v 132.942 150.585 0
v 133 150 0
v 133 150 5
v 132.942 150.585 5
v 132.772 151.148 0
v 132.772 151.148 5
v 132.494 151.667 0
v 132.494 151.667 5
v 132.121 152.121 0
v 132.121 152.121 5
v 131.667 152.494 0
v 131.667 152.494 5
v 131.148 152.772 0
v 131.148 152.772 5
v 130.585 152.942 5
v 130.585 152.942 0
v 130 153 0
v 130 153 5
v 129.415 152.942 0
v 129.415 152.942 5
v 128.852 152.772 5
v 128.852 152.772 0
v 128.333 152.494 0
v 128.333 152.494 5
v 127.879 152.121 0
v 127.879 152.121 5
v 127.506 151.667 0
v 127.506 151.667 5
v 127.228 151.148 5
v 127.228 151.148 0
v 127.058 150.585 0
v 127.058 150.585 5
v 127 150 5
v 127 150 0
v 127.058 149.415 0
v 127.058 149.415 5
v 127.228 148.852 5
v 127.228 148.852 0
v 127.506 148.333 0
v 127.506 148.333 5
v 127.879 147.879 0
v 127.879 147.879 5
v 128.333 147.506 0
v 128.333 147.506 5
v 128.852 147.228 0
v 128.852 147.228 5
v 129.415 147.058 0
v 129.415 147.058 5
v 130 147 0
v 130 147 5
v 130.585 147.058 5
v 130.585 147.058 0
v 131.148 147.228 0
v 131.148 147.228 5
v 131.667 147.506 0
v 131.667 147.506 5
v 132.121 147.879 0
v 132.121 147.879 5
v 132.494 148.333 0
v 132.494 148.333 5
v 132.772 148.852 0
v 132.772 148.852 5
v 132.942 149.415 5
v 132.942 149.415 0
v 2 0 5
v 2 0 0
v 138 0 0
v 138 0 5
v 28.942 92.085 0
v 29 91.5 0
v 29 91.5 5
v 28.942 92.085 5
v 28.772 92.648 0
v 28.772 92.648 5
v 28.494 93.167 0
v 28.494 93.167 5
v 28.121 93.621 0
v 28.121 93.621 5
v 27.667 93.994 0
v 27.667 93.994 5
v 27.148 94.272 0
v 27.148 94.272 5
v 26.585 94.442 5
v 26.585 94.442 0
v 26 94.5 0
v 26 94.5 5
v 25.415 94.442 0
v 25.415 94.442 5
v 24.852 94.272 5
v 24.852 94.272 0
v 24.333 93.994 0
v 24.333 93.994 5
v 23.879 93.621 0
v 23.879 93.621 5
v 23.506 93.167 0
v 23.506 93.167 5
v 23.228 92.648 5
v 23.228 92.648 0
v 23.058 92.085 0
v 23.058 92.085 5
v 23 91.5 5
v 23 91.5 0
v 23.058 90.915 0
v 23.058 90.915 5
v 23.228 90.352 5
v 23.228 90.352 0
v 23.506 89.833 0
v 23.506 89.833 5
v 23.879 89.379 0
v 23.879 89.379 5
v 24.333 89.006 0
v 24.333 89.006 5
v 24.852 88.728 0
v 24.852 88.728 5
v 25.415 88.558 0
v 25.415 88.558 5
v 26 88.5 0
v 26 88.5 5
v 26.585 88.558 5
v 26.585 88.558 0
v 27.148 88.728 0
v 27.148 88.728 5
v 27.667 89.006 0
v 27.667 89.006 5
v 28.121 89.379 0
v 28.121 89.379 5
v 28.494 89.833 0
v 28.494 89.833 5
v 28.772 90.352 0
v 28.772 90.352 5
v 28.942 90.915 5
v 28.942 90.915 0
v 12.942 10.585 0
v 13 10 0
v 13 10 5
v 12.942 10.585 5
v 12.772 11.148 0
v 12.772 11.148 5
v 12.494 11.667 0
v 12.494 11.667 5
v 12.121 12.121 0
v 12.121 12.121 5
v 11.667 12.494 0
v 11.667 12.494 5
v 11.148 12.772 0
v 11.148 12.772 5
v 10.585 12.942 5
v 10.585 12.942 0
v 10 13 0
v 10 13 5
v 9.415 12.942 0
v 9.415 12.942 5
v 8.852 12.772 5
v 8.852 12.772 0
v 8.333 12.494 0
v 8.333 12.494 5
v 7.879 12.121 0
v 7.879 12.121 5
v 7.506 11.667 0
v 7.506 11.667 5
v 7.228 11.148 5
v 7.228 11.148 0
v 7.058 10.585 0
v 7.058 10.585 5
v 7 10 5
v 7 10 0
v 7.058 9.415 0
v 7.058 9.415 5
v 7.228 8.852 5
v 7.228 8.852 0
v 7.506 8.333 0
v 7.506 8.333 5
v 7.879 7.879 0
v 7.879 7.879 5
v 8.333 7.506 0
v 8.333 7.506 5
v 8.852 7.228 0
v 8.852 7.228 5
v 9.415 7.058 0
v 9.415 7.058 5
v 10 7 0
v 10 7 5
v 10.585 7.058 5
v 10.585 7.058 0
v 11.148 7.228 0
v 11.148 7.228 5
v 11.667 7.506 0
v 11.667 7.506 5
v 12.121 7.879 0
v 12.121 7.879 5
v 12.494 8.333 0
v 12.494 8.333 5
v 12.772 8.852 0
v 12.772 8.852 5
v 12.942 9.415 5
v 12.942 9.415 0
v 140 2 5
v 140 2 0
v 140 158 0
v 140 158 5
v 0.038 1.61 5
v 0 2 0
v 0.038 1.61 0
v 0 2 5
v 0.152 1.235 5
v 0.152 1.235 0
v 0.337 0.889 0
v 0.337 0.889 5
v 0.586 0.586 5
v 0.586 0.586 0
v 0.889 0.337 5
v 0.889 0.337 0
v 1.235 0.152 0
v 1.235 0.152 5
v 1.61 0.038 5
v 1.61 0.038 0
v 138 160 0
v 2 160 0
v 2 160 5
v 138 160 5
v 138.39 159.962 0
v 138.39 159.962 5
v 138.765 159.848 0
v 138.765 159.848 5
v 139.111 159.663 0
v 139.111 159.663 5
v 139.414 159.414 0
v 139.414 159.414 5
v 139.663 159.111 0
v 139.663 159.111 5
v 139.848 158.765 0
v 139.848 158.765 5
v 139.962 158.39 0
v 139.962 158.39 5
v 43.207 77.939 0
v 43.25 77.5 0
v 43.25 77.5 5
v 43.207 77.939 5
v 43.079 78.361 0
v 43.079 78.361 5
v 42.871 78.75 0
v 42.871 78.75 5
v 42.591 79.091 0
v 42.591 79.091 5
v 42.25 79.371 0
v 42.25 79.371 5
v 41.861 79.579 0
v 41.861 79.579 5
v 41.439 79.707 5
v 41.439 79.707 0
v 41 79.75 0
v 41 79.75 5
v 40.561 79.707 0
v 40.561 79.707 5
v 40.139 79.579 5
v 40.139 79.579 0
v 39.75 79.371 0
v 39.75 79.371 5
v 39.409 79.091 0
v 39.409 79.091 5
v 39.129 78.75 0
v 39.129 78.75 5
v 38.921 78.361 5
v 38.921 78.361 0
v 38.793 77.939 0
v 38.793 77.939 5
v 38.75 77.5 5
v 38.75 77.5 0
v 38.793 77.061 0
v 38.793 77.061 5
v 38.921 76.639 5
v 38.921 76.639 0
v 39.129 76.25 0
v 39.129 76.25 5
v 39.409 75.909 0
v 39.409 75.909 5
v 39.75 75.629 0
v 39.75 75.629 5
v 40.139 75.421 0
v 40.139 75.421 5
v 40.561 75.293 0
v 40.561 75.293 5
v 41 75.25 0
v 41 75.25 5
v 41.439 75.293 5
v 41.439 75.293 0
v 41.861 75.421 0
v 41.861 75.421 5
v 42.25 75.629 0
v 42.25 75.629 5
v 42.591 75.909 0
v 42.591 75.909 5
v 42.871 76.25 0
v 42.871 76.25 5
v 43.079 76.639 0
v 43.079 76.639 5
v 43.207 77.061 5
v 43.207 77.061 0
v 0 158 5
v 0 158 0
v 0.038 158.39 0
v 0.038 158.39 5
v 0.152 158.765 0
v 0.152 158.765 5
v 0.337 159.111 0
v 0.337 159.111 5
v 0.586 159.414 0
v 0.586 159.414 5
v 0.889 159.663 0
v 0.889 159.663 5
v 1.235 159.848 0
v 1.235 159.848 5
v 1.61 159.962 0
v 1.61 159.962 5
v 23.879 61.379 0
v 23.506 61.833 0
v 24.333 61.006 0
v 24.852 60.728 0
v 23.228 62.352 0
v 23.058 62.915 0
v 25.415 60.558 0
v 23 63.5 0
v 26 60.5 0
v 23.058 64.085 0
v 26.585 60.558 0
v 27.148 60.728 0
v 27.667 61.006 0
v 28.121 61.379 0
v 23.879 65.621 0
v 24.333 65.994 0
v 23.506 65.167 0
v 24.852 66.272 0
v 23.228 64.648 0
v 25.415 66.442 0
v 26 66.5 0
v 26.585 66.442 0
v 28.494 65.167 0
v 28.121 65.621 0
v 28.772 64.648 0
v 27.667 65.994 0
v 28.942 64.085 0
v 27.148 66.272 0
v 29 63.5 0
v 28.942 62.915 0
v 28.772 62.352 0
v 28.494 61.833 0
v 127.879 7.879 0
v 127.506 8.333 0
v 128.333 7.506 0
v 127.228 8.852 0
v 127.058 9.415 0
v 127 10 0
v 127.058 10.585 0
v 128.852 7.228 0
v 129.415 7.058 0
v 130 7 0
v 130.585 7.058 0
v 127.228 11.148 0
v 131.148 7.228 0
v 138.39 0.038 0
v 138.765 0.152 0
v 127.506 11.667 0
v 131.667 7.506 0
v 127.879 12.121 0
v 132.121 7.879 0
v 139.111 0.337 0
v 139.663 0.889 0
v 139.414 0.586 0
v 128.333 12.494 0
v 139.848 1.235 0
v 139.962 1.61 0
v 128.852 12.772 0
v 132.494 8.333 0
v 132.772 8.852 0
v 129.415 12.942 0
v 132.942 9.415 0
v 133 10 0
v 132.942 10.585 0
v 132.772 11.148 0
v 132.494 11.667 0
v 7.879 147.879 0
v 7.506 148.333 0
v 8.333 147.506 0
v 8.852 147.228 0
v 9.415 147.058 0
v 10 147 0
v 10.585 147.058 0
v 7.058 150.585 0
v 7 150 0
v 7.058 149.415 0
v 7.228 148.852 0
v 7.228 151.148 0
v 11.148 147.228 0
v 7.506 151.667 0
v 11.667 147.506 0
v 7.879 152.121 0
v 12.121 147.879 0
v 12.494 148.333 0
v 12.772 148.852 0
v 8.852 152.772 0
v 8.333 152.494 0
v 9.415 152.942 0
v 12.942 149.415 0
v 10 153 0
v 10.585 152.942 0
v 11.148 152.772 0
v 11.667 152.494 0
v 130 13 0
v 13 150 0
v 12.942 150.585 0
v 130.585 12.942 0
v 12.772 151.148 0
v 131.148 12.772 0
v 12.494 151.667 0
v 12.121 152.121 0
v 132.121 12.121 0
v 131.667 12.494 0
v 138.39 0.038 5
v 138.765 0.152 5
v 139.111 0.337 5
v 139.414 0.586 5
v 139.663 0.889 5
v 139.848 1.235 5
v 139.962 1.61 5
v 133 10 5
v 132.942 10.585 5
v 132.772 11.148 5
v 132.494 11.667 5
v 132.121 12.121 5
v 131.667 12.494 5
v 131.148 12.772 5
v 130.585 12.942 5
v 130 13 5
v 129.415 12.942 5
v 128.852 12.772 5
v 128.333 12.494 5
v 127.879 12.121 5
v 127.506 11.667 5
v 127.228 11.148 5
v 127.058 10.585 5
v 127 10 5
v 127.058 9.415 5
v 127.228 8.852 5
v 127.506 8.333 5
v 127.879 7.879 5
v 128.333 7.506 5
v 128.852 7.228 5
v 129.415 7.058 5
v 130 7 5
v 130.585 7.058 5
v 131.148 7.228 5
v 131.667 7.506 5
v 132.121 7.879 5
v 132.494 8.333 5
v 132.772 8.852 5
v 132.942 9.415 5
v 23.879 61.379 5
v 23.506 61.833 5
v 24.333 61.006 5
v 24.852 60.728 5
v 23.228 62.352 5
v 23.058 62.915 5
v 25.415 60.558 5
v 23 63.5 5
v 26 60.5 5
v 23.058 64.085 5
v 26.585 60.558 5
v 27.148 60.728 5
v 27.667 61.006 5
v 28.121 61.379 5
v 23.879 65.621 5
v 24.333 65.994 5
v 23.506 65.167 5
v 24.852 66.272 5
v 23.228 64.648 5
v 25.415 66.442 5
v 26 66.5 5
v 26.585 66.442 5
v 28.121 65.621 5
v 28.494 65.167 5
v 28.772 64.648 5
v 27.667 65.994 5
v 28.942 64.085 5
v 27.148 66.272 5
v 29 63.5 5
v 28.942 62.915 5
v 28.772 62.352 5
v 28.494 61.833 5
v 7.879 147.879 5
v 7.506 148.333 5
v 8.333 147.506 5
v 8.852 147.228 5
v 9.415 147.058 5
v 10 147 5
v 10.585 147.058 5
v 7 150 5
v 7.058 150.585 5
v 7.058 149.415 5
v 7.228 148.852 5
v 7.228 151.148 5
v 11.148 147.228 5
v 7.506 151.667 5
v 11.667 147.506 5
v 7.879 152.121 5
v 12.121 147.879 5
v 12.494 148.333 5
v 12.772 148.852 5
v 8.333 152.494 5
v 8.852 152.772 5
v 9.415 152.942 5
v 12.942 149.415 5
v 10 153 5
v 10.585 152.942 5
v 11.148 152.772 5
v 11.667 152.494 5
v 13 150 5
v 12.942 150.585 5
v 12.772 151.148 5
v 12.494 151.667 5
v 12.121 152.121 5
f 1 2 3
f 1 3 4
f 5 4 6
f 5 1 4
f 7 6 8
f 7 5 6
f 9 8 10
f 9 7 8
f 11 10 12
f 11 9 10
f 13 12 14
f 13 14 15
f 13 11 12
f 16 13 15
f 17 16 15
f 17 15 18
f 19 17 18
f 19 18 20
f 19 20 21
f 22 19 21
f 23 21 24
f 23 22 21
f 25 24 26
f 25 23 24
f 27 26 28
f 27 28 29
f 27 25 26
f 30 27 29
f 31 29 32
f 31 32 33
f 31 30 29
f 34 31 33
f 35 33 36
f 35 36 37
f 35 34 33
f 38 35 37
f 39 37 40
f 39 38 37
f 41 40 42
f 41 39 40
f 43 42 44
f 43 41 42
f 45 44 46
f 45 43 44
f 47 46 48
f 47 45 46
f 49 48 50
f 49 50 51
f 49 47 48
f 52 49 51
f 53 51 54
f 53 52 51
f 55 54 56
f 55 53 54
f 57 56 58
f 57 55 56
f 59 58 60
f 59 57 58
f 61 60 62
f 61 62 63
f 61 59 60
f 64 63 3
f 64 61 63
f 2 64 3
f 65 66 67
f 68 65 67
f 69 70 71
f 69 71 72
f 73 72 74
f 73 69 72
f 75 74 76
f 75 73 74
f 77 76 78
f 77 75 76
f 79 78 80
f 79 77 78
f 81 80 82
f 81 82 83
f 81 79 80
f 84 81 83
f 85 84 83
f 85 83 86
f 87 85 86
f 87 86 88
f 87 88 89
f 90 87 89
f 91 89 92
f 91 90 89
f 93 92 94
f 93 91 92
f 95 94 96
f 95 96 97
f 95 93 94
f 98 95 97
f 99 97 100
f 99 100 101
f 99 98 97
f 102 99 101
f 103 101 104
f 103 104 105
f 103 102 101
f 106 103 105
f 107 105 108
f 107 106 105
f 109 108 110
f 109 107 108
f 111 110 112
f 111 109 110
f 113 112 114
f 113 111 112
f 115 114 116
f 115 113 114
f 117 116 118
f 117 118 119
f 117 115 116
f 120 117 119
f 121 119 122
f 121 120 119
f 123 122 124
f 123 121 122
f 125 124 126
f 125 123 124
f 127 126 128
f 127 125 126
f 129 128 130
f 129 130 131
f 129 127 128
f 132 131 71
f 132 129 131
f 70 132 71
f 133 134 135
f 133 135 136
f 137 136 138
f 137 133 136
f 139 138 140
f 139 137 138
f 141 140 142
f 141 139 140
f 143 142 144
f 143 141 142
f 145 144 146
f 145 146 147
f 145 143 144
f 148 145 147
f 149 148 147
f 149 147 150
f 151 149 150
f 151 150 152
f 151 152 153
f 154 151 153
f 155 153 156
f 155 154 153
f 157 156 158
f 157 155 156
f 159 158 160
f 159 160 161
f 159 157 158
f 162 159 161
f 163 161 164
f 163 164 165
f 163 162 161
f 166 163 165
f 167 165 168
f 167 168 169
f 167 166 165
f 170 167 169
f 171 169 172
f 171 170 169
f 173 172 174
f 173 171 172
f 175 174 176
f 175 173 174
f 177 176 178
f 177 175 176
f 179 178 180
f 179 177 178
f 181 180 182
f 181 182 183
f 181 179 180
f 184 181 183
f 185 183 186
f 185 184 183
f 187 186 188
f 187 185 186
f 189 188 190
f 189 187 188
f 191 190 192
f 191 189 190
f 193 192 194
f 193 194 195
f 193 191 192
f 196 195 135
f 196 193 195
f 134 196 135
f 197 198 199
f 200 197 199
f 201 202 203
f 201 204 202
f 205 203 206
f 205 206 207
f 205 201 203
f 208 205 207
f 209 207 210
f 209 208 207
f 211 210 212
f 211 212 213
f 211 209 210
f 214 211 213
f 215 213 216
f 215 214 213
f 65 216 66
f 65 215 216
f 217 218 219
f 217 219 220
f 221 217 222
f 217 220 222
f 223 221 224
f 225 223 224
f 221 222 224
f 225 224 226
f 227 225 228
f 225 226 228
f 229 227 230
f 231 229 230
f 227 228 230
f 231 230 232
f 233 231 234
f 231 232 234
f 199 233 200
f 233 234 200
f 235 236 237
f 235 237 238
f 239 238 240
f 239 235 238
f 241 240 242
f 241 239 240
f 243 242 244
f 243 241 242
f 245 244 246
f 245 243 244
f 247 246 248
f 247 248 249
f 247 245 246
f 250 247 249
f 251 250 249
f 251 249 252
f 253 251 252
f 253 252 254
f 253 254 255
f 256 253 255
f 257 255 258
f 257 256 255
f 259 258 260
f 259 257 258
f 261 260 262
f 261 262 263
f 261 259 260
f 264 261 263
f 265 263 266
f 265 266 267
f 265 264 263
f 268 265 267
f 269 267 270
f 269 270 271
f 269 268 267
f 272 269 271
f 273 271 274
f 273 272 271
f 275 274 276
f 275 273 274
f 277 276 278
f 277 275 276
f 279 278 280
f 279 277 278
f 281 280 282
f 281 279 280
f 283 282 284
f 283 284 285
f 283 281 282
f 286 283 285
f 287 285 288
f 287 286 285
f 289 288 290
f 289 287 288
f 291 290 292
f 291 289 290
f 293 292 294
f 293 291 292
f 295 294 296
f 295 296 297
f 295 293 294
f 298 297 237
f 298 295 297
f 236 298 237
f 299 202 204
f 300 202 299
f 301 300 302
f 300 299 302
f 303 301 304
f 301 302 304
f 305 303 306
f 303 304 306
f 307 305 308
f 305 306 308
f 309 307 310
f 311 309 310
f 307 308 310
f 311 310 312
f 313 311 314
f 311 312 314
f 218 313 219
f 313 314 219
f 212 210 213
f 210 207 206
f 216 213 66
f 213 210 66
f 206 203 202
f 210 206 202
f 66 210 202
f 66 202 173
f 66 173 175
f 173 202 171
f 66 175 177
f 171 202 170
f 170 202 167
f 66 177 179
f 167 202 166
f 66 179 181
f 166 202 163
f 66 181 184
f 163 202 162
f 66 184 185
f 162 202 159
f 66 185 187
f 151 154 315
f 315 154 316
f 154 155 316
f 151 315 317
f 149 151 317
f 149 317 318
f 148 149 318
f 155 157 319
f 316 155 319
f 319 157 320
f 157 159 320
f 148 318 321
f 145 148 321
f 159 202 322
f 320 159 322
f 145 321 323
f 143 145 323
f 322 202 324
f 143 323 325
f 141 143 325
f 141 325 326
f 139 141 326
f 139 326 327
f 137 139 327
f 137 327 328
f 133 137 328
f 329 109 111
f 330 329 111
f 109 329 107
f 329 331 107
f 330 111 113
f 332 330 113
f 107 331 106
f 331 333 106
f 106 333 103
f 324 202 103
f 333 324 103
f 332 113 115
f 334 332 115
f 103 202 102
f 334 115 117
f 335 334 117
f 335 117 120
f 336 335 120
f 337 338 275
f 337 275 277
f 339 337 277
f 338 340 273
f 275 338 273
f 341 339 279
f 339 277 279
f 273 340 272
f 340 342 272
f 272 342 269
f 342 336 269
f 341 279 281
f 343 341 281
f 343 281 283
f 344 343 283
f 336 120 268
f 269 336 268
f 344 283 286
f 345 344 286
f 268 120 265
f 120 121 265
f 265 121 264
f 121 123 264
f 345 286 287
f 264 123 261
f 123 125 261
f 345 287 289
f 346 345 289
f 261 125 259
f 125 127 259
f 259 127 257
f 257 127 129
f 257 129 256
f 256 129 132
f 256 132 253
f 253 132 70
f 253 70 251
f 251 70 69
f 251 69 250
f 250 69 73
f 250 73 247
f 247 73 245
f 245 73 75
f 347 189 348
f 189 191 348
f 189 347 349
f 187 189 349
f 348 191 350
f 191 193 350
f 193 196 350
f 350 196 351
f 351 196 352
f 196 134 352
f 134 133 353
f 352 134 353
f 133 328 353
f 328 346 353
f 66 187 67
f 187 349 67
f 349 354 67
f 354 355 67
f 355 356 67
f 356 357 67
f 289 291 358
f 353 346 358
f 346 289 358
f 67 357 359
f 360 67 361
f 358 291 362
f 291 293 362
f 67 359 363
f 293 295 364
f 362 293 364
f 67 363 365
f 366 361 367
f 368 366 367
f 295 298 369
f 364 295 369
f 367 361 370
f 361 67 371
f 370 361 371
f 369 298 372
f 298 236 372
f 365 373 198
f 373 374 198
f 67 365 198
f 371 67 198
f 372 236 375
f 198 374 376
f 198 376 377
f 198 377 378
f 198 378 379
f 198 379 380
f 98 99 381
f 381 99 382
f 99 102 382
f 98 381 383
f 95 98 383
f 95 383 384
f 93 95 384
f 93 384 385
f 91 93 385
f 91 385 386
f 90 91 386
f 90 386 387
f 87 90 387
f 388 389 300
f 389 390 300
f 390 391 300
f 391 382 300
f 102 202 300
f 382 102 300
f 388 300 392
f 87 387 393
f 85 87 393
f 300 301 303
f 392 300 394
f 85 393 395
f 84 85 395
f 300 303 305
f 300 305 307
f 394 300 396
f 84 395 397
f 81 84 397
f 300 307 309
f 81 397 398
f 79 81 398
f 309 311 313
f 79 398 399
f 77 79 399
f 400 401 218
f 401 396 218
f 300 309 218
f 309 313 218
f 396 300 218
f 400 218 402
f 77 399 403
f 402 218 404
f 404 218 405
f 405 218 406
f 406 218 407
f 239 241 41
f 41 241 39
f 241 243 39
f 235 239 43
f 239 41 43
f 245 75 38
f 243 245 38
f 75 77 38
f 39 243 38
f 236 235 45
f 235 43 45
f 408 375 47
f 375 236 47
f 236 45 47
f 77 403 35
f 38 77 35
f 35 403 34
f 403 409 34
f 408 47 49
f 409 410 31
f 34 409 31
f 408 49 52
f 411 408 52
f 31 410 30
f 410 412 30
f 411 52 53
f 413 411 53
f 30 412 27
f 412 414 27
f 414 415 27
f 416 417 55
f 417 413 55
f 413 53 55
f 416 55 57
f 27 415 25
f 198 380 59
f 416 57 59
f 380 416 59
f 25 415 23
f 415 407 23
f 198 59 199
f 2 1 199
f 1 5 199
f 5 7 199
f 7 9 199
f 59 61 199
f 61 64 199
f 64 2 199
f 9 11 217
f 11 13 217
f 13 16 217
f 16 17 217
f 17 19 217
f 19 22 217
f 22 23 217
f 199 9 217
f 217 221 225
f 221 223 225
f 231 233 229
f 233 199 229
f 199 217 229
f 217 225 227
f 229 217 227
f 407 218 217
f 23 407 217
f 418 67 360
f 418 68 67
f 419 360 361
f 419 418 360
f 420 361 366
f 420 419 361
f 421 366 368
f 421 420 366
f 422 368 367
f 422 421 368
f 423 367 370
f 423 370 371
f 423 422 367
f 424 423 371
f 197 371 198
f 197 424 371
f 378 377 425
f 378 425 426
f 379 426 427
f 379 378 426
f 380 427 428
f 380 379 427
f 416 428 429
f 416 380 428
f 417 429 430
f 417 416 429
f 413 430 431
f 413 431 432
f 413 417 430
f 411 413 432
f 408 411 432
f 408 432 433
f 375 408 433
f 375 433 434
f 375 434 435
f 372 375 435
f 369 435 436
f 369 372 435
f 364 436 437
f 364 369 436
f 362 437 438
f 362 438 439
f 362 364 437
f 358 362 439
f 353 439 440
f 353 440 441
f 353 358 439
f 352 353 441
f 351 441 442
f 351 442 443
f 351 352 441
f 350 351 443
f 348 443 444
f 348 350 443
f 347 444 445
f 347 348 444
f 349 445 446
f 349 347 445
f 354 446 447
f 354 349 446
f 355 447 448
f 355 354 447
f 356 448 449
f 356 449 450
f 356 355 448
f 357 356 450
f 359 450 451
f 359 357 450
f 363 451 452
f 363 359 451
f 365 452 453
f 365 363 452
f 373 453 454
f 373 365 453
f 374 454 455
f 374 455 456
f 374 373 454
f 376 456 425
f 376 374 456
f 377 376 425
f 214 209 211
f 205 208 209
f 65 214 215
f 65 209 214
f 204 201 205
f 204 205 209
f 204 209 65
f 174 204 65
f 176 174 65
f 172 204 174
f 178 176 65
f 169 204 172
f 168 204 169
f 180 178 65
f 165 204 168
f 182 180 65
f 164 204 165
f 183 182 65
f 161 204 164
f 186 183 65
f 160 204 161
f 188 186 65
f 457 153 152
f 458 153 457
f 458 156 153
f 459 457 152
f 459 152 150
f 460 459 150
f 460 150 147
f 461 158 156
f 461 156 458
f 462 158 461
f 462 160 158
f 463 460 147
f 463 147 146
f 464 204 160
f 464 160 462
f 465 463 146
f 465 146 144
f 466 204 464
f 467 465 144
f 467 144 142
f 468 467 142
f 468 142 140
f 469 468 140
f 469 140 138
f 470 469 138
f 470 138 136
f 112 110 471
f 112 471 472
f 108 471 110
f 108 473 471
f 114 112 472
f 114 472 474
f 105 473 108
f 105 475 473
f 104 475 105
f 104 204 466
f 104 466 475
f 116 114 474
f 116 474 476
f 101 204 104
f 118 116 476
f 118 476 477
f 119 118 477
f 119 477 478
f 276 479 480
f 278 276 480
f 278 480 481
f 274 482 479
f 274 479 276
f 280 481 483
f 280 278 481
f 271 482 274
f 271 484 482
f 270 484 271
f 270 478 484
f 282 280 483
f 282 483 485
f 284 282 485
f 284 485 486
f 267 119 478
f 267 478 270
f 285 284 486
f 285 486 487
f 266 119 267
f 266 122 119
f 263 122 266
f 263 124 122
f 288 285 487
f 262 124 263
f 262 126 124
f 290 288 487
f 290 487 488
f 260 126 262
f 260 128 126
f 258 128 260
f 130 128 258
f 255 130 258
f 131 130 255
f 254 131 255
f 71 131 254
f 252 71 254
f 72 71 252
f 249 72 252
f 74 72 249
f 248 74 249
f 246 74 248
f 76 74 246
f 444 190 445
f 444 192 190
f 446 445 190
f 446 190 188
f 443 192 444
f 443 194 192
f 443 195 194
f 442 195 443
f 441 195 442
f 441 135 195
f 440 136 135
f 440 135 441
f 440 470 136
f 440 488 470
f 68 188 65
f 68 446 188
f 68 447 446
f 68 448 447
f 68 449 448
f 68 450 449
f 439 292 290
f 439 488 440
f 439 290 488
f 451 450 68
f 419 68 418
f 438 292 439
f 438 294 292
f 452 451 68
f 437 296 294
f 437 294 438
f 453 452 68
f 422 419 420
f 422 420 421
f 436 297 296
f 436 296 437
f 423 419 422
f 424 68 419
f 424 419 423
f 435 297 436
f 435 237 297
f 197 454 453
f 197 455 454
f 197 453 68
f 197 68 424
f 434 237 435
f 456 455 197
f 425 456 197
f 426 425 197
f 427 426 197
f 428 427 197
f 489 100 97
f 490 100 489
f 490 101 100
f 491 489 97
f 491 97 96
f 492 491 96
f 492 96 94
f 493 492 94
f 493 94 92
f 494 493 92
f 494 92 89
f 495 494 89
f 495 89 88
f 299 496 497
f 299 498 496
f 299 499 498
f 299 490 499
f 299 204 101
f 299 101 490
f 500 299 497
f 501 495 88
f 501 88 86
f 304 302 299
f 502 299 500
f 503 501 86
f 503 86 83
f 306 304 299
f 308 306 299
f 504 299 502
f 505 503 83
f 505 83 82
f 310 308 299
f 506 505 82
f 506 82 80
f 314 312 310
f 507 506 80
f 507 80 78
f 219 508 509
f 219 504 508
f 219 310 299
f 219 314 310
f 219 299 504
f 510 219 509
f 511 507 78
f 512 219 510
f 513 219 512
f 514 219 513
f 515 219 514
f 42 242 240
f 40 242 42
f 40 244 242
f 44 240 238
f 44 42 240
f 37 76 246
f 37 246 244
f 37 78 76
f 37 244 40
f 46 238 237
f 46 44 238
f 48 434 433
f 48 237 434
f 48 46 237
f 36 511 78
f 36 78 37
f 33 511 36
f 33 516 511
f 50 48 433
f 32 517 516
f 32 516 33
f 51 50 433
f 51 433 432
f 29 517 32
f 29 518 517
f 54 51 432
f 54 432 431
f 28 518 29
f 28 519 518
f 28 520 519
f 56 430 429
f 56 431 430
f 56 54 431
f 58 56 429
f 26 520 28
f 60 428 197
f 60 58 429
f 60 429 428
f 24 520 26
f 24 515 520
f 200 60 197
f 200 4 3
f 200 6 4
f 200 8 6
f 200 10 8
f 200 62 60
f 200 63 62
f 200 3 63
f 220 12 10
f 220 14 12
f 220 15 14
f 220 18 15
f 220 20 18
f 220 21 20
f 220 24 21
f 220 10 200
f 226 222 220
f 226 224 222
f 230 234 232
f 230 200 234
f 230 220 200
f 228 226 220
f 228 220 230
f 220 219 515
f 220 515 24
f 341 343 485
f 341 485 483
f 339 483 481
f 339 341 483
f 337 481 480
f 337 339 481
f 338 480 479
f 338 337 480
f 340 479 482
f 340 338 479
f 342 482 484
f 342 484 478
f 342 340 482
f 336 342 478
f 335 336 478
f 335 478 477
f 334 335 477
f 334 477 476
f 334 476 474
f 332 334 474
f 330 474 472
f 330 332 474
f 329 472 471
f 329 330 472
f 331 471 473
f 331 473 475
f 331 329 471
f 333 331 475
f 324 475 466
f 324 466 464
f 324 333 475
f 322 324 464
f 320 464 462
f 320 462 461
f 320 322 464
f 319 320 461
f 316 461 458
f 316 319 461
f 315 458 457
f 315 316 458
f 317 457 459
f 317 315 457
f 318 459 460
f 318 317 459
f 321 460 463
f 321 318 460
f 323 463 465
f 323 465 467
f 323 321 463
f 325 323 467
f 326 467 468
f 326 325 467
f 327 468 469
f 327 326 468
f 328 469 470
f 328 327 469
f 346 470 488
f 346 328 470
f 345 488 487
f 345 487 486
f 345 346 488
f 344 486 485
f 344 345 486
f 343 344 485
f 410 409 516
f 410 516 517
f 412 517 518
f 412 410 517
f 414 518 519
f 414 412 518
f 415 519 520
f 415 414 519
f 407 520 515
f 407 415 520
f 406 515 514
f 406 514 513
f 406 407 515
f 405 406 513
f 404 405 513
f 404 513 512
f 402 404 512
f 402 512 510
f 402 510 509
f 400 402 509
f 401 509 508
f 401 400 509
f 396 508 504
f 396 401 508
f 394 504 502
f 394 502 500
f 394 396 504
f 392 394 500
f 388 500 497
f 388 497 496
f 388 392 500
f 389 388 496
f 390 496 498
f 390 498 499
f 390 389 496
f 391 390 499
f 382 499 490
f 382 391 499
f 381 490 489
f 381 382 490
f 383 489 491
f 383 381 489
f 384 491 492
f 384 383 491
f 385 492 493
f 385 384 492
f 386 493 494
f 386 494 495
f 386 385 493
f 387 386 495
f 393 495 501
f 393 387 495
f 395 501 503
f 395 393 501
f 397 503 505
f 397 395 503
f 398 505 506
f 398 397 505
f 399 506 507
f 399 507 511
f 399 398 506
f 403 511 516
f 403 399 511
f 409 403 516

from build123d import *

# Parameters (mm, degrees)
MODEL_W             = 140
MODEL_H             = 160
MODEL_R             = 3
MODEL_R_2           = 2.25
BOSS_EXTRUDE1_DEPTH = 5
FILLET1_R           = 2


with BuildPart() as part:
    # Model → Boss-Extrude1 (new body)
    with BuildSketch(Plane.XY):
        with Locations((70, 80)):
            Rectangle(MODEL_W, MODEL_H)
        with Locations((26, 91.5)):
            Circle(MODEL_R, mode=Mode.SUBTRACT)
        with Locations((10, 150)):
            Circle(MODEL_R, mode=Mode.SUBTRACT)
        with Locations((130, 10)):
            Circle(MODEL_R, mode=Mode.SUBTRACT)
        with Locations((10, 10)):
            Circle(MODEL_R, mode=Mode.SUBTRACT)
        with Locations((130, 150)):
            Circle(MODEL_R, mode=Mode.SUBTRACT)
        with Locations((26, 63.5)):
            Circle(MODEL_R, mode=Mode.SUBTRACT)
        with Locations((41, 77.5)):
            Circle(MODEL_R_2, mode=Mode.SUBTRACT)
    extrude(amount=BOSS_EXTRUDE1_DEPTH)

    # Fillet1
    fillet1_edges = [part.edges().sort_by_distance(p)[0] for p in [
        (0, 0, 2.5),
        (0, 160, 2.5),
        (140, 160, 2.5),
        (140, 0, 2.5),
    ]]
    fillet(fillet1_edges, radius=FILLET1_R)


solid = part.part
